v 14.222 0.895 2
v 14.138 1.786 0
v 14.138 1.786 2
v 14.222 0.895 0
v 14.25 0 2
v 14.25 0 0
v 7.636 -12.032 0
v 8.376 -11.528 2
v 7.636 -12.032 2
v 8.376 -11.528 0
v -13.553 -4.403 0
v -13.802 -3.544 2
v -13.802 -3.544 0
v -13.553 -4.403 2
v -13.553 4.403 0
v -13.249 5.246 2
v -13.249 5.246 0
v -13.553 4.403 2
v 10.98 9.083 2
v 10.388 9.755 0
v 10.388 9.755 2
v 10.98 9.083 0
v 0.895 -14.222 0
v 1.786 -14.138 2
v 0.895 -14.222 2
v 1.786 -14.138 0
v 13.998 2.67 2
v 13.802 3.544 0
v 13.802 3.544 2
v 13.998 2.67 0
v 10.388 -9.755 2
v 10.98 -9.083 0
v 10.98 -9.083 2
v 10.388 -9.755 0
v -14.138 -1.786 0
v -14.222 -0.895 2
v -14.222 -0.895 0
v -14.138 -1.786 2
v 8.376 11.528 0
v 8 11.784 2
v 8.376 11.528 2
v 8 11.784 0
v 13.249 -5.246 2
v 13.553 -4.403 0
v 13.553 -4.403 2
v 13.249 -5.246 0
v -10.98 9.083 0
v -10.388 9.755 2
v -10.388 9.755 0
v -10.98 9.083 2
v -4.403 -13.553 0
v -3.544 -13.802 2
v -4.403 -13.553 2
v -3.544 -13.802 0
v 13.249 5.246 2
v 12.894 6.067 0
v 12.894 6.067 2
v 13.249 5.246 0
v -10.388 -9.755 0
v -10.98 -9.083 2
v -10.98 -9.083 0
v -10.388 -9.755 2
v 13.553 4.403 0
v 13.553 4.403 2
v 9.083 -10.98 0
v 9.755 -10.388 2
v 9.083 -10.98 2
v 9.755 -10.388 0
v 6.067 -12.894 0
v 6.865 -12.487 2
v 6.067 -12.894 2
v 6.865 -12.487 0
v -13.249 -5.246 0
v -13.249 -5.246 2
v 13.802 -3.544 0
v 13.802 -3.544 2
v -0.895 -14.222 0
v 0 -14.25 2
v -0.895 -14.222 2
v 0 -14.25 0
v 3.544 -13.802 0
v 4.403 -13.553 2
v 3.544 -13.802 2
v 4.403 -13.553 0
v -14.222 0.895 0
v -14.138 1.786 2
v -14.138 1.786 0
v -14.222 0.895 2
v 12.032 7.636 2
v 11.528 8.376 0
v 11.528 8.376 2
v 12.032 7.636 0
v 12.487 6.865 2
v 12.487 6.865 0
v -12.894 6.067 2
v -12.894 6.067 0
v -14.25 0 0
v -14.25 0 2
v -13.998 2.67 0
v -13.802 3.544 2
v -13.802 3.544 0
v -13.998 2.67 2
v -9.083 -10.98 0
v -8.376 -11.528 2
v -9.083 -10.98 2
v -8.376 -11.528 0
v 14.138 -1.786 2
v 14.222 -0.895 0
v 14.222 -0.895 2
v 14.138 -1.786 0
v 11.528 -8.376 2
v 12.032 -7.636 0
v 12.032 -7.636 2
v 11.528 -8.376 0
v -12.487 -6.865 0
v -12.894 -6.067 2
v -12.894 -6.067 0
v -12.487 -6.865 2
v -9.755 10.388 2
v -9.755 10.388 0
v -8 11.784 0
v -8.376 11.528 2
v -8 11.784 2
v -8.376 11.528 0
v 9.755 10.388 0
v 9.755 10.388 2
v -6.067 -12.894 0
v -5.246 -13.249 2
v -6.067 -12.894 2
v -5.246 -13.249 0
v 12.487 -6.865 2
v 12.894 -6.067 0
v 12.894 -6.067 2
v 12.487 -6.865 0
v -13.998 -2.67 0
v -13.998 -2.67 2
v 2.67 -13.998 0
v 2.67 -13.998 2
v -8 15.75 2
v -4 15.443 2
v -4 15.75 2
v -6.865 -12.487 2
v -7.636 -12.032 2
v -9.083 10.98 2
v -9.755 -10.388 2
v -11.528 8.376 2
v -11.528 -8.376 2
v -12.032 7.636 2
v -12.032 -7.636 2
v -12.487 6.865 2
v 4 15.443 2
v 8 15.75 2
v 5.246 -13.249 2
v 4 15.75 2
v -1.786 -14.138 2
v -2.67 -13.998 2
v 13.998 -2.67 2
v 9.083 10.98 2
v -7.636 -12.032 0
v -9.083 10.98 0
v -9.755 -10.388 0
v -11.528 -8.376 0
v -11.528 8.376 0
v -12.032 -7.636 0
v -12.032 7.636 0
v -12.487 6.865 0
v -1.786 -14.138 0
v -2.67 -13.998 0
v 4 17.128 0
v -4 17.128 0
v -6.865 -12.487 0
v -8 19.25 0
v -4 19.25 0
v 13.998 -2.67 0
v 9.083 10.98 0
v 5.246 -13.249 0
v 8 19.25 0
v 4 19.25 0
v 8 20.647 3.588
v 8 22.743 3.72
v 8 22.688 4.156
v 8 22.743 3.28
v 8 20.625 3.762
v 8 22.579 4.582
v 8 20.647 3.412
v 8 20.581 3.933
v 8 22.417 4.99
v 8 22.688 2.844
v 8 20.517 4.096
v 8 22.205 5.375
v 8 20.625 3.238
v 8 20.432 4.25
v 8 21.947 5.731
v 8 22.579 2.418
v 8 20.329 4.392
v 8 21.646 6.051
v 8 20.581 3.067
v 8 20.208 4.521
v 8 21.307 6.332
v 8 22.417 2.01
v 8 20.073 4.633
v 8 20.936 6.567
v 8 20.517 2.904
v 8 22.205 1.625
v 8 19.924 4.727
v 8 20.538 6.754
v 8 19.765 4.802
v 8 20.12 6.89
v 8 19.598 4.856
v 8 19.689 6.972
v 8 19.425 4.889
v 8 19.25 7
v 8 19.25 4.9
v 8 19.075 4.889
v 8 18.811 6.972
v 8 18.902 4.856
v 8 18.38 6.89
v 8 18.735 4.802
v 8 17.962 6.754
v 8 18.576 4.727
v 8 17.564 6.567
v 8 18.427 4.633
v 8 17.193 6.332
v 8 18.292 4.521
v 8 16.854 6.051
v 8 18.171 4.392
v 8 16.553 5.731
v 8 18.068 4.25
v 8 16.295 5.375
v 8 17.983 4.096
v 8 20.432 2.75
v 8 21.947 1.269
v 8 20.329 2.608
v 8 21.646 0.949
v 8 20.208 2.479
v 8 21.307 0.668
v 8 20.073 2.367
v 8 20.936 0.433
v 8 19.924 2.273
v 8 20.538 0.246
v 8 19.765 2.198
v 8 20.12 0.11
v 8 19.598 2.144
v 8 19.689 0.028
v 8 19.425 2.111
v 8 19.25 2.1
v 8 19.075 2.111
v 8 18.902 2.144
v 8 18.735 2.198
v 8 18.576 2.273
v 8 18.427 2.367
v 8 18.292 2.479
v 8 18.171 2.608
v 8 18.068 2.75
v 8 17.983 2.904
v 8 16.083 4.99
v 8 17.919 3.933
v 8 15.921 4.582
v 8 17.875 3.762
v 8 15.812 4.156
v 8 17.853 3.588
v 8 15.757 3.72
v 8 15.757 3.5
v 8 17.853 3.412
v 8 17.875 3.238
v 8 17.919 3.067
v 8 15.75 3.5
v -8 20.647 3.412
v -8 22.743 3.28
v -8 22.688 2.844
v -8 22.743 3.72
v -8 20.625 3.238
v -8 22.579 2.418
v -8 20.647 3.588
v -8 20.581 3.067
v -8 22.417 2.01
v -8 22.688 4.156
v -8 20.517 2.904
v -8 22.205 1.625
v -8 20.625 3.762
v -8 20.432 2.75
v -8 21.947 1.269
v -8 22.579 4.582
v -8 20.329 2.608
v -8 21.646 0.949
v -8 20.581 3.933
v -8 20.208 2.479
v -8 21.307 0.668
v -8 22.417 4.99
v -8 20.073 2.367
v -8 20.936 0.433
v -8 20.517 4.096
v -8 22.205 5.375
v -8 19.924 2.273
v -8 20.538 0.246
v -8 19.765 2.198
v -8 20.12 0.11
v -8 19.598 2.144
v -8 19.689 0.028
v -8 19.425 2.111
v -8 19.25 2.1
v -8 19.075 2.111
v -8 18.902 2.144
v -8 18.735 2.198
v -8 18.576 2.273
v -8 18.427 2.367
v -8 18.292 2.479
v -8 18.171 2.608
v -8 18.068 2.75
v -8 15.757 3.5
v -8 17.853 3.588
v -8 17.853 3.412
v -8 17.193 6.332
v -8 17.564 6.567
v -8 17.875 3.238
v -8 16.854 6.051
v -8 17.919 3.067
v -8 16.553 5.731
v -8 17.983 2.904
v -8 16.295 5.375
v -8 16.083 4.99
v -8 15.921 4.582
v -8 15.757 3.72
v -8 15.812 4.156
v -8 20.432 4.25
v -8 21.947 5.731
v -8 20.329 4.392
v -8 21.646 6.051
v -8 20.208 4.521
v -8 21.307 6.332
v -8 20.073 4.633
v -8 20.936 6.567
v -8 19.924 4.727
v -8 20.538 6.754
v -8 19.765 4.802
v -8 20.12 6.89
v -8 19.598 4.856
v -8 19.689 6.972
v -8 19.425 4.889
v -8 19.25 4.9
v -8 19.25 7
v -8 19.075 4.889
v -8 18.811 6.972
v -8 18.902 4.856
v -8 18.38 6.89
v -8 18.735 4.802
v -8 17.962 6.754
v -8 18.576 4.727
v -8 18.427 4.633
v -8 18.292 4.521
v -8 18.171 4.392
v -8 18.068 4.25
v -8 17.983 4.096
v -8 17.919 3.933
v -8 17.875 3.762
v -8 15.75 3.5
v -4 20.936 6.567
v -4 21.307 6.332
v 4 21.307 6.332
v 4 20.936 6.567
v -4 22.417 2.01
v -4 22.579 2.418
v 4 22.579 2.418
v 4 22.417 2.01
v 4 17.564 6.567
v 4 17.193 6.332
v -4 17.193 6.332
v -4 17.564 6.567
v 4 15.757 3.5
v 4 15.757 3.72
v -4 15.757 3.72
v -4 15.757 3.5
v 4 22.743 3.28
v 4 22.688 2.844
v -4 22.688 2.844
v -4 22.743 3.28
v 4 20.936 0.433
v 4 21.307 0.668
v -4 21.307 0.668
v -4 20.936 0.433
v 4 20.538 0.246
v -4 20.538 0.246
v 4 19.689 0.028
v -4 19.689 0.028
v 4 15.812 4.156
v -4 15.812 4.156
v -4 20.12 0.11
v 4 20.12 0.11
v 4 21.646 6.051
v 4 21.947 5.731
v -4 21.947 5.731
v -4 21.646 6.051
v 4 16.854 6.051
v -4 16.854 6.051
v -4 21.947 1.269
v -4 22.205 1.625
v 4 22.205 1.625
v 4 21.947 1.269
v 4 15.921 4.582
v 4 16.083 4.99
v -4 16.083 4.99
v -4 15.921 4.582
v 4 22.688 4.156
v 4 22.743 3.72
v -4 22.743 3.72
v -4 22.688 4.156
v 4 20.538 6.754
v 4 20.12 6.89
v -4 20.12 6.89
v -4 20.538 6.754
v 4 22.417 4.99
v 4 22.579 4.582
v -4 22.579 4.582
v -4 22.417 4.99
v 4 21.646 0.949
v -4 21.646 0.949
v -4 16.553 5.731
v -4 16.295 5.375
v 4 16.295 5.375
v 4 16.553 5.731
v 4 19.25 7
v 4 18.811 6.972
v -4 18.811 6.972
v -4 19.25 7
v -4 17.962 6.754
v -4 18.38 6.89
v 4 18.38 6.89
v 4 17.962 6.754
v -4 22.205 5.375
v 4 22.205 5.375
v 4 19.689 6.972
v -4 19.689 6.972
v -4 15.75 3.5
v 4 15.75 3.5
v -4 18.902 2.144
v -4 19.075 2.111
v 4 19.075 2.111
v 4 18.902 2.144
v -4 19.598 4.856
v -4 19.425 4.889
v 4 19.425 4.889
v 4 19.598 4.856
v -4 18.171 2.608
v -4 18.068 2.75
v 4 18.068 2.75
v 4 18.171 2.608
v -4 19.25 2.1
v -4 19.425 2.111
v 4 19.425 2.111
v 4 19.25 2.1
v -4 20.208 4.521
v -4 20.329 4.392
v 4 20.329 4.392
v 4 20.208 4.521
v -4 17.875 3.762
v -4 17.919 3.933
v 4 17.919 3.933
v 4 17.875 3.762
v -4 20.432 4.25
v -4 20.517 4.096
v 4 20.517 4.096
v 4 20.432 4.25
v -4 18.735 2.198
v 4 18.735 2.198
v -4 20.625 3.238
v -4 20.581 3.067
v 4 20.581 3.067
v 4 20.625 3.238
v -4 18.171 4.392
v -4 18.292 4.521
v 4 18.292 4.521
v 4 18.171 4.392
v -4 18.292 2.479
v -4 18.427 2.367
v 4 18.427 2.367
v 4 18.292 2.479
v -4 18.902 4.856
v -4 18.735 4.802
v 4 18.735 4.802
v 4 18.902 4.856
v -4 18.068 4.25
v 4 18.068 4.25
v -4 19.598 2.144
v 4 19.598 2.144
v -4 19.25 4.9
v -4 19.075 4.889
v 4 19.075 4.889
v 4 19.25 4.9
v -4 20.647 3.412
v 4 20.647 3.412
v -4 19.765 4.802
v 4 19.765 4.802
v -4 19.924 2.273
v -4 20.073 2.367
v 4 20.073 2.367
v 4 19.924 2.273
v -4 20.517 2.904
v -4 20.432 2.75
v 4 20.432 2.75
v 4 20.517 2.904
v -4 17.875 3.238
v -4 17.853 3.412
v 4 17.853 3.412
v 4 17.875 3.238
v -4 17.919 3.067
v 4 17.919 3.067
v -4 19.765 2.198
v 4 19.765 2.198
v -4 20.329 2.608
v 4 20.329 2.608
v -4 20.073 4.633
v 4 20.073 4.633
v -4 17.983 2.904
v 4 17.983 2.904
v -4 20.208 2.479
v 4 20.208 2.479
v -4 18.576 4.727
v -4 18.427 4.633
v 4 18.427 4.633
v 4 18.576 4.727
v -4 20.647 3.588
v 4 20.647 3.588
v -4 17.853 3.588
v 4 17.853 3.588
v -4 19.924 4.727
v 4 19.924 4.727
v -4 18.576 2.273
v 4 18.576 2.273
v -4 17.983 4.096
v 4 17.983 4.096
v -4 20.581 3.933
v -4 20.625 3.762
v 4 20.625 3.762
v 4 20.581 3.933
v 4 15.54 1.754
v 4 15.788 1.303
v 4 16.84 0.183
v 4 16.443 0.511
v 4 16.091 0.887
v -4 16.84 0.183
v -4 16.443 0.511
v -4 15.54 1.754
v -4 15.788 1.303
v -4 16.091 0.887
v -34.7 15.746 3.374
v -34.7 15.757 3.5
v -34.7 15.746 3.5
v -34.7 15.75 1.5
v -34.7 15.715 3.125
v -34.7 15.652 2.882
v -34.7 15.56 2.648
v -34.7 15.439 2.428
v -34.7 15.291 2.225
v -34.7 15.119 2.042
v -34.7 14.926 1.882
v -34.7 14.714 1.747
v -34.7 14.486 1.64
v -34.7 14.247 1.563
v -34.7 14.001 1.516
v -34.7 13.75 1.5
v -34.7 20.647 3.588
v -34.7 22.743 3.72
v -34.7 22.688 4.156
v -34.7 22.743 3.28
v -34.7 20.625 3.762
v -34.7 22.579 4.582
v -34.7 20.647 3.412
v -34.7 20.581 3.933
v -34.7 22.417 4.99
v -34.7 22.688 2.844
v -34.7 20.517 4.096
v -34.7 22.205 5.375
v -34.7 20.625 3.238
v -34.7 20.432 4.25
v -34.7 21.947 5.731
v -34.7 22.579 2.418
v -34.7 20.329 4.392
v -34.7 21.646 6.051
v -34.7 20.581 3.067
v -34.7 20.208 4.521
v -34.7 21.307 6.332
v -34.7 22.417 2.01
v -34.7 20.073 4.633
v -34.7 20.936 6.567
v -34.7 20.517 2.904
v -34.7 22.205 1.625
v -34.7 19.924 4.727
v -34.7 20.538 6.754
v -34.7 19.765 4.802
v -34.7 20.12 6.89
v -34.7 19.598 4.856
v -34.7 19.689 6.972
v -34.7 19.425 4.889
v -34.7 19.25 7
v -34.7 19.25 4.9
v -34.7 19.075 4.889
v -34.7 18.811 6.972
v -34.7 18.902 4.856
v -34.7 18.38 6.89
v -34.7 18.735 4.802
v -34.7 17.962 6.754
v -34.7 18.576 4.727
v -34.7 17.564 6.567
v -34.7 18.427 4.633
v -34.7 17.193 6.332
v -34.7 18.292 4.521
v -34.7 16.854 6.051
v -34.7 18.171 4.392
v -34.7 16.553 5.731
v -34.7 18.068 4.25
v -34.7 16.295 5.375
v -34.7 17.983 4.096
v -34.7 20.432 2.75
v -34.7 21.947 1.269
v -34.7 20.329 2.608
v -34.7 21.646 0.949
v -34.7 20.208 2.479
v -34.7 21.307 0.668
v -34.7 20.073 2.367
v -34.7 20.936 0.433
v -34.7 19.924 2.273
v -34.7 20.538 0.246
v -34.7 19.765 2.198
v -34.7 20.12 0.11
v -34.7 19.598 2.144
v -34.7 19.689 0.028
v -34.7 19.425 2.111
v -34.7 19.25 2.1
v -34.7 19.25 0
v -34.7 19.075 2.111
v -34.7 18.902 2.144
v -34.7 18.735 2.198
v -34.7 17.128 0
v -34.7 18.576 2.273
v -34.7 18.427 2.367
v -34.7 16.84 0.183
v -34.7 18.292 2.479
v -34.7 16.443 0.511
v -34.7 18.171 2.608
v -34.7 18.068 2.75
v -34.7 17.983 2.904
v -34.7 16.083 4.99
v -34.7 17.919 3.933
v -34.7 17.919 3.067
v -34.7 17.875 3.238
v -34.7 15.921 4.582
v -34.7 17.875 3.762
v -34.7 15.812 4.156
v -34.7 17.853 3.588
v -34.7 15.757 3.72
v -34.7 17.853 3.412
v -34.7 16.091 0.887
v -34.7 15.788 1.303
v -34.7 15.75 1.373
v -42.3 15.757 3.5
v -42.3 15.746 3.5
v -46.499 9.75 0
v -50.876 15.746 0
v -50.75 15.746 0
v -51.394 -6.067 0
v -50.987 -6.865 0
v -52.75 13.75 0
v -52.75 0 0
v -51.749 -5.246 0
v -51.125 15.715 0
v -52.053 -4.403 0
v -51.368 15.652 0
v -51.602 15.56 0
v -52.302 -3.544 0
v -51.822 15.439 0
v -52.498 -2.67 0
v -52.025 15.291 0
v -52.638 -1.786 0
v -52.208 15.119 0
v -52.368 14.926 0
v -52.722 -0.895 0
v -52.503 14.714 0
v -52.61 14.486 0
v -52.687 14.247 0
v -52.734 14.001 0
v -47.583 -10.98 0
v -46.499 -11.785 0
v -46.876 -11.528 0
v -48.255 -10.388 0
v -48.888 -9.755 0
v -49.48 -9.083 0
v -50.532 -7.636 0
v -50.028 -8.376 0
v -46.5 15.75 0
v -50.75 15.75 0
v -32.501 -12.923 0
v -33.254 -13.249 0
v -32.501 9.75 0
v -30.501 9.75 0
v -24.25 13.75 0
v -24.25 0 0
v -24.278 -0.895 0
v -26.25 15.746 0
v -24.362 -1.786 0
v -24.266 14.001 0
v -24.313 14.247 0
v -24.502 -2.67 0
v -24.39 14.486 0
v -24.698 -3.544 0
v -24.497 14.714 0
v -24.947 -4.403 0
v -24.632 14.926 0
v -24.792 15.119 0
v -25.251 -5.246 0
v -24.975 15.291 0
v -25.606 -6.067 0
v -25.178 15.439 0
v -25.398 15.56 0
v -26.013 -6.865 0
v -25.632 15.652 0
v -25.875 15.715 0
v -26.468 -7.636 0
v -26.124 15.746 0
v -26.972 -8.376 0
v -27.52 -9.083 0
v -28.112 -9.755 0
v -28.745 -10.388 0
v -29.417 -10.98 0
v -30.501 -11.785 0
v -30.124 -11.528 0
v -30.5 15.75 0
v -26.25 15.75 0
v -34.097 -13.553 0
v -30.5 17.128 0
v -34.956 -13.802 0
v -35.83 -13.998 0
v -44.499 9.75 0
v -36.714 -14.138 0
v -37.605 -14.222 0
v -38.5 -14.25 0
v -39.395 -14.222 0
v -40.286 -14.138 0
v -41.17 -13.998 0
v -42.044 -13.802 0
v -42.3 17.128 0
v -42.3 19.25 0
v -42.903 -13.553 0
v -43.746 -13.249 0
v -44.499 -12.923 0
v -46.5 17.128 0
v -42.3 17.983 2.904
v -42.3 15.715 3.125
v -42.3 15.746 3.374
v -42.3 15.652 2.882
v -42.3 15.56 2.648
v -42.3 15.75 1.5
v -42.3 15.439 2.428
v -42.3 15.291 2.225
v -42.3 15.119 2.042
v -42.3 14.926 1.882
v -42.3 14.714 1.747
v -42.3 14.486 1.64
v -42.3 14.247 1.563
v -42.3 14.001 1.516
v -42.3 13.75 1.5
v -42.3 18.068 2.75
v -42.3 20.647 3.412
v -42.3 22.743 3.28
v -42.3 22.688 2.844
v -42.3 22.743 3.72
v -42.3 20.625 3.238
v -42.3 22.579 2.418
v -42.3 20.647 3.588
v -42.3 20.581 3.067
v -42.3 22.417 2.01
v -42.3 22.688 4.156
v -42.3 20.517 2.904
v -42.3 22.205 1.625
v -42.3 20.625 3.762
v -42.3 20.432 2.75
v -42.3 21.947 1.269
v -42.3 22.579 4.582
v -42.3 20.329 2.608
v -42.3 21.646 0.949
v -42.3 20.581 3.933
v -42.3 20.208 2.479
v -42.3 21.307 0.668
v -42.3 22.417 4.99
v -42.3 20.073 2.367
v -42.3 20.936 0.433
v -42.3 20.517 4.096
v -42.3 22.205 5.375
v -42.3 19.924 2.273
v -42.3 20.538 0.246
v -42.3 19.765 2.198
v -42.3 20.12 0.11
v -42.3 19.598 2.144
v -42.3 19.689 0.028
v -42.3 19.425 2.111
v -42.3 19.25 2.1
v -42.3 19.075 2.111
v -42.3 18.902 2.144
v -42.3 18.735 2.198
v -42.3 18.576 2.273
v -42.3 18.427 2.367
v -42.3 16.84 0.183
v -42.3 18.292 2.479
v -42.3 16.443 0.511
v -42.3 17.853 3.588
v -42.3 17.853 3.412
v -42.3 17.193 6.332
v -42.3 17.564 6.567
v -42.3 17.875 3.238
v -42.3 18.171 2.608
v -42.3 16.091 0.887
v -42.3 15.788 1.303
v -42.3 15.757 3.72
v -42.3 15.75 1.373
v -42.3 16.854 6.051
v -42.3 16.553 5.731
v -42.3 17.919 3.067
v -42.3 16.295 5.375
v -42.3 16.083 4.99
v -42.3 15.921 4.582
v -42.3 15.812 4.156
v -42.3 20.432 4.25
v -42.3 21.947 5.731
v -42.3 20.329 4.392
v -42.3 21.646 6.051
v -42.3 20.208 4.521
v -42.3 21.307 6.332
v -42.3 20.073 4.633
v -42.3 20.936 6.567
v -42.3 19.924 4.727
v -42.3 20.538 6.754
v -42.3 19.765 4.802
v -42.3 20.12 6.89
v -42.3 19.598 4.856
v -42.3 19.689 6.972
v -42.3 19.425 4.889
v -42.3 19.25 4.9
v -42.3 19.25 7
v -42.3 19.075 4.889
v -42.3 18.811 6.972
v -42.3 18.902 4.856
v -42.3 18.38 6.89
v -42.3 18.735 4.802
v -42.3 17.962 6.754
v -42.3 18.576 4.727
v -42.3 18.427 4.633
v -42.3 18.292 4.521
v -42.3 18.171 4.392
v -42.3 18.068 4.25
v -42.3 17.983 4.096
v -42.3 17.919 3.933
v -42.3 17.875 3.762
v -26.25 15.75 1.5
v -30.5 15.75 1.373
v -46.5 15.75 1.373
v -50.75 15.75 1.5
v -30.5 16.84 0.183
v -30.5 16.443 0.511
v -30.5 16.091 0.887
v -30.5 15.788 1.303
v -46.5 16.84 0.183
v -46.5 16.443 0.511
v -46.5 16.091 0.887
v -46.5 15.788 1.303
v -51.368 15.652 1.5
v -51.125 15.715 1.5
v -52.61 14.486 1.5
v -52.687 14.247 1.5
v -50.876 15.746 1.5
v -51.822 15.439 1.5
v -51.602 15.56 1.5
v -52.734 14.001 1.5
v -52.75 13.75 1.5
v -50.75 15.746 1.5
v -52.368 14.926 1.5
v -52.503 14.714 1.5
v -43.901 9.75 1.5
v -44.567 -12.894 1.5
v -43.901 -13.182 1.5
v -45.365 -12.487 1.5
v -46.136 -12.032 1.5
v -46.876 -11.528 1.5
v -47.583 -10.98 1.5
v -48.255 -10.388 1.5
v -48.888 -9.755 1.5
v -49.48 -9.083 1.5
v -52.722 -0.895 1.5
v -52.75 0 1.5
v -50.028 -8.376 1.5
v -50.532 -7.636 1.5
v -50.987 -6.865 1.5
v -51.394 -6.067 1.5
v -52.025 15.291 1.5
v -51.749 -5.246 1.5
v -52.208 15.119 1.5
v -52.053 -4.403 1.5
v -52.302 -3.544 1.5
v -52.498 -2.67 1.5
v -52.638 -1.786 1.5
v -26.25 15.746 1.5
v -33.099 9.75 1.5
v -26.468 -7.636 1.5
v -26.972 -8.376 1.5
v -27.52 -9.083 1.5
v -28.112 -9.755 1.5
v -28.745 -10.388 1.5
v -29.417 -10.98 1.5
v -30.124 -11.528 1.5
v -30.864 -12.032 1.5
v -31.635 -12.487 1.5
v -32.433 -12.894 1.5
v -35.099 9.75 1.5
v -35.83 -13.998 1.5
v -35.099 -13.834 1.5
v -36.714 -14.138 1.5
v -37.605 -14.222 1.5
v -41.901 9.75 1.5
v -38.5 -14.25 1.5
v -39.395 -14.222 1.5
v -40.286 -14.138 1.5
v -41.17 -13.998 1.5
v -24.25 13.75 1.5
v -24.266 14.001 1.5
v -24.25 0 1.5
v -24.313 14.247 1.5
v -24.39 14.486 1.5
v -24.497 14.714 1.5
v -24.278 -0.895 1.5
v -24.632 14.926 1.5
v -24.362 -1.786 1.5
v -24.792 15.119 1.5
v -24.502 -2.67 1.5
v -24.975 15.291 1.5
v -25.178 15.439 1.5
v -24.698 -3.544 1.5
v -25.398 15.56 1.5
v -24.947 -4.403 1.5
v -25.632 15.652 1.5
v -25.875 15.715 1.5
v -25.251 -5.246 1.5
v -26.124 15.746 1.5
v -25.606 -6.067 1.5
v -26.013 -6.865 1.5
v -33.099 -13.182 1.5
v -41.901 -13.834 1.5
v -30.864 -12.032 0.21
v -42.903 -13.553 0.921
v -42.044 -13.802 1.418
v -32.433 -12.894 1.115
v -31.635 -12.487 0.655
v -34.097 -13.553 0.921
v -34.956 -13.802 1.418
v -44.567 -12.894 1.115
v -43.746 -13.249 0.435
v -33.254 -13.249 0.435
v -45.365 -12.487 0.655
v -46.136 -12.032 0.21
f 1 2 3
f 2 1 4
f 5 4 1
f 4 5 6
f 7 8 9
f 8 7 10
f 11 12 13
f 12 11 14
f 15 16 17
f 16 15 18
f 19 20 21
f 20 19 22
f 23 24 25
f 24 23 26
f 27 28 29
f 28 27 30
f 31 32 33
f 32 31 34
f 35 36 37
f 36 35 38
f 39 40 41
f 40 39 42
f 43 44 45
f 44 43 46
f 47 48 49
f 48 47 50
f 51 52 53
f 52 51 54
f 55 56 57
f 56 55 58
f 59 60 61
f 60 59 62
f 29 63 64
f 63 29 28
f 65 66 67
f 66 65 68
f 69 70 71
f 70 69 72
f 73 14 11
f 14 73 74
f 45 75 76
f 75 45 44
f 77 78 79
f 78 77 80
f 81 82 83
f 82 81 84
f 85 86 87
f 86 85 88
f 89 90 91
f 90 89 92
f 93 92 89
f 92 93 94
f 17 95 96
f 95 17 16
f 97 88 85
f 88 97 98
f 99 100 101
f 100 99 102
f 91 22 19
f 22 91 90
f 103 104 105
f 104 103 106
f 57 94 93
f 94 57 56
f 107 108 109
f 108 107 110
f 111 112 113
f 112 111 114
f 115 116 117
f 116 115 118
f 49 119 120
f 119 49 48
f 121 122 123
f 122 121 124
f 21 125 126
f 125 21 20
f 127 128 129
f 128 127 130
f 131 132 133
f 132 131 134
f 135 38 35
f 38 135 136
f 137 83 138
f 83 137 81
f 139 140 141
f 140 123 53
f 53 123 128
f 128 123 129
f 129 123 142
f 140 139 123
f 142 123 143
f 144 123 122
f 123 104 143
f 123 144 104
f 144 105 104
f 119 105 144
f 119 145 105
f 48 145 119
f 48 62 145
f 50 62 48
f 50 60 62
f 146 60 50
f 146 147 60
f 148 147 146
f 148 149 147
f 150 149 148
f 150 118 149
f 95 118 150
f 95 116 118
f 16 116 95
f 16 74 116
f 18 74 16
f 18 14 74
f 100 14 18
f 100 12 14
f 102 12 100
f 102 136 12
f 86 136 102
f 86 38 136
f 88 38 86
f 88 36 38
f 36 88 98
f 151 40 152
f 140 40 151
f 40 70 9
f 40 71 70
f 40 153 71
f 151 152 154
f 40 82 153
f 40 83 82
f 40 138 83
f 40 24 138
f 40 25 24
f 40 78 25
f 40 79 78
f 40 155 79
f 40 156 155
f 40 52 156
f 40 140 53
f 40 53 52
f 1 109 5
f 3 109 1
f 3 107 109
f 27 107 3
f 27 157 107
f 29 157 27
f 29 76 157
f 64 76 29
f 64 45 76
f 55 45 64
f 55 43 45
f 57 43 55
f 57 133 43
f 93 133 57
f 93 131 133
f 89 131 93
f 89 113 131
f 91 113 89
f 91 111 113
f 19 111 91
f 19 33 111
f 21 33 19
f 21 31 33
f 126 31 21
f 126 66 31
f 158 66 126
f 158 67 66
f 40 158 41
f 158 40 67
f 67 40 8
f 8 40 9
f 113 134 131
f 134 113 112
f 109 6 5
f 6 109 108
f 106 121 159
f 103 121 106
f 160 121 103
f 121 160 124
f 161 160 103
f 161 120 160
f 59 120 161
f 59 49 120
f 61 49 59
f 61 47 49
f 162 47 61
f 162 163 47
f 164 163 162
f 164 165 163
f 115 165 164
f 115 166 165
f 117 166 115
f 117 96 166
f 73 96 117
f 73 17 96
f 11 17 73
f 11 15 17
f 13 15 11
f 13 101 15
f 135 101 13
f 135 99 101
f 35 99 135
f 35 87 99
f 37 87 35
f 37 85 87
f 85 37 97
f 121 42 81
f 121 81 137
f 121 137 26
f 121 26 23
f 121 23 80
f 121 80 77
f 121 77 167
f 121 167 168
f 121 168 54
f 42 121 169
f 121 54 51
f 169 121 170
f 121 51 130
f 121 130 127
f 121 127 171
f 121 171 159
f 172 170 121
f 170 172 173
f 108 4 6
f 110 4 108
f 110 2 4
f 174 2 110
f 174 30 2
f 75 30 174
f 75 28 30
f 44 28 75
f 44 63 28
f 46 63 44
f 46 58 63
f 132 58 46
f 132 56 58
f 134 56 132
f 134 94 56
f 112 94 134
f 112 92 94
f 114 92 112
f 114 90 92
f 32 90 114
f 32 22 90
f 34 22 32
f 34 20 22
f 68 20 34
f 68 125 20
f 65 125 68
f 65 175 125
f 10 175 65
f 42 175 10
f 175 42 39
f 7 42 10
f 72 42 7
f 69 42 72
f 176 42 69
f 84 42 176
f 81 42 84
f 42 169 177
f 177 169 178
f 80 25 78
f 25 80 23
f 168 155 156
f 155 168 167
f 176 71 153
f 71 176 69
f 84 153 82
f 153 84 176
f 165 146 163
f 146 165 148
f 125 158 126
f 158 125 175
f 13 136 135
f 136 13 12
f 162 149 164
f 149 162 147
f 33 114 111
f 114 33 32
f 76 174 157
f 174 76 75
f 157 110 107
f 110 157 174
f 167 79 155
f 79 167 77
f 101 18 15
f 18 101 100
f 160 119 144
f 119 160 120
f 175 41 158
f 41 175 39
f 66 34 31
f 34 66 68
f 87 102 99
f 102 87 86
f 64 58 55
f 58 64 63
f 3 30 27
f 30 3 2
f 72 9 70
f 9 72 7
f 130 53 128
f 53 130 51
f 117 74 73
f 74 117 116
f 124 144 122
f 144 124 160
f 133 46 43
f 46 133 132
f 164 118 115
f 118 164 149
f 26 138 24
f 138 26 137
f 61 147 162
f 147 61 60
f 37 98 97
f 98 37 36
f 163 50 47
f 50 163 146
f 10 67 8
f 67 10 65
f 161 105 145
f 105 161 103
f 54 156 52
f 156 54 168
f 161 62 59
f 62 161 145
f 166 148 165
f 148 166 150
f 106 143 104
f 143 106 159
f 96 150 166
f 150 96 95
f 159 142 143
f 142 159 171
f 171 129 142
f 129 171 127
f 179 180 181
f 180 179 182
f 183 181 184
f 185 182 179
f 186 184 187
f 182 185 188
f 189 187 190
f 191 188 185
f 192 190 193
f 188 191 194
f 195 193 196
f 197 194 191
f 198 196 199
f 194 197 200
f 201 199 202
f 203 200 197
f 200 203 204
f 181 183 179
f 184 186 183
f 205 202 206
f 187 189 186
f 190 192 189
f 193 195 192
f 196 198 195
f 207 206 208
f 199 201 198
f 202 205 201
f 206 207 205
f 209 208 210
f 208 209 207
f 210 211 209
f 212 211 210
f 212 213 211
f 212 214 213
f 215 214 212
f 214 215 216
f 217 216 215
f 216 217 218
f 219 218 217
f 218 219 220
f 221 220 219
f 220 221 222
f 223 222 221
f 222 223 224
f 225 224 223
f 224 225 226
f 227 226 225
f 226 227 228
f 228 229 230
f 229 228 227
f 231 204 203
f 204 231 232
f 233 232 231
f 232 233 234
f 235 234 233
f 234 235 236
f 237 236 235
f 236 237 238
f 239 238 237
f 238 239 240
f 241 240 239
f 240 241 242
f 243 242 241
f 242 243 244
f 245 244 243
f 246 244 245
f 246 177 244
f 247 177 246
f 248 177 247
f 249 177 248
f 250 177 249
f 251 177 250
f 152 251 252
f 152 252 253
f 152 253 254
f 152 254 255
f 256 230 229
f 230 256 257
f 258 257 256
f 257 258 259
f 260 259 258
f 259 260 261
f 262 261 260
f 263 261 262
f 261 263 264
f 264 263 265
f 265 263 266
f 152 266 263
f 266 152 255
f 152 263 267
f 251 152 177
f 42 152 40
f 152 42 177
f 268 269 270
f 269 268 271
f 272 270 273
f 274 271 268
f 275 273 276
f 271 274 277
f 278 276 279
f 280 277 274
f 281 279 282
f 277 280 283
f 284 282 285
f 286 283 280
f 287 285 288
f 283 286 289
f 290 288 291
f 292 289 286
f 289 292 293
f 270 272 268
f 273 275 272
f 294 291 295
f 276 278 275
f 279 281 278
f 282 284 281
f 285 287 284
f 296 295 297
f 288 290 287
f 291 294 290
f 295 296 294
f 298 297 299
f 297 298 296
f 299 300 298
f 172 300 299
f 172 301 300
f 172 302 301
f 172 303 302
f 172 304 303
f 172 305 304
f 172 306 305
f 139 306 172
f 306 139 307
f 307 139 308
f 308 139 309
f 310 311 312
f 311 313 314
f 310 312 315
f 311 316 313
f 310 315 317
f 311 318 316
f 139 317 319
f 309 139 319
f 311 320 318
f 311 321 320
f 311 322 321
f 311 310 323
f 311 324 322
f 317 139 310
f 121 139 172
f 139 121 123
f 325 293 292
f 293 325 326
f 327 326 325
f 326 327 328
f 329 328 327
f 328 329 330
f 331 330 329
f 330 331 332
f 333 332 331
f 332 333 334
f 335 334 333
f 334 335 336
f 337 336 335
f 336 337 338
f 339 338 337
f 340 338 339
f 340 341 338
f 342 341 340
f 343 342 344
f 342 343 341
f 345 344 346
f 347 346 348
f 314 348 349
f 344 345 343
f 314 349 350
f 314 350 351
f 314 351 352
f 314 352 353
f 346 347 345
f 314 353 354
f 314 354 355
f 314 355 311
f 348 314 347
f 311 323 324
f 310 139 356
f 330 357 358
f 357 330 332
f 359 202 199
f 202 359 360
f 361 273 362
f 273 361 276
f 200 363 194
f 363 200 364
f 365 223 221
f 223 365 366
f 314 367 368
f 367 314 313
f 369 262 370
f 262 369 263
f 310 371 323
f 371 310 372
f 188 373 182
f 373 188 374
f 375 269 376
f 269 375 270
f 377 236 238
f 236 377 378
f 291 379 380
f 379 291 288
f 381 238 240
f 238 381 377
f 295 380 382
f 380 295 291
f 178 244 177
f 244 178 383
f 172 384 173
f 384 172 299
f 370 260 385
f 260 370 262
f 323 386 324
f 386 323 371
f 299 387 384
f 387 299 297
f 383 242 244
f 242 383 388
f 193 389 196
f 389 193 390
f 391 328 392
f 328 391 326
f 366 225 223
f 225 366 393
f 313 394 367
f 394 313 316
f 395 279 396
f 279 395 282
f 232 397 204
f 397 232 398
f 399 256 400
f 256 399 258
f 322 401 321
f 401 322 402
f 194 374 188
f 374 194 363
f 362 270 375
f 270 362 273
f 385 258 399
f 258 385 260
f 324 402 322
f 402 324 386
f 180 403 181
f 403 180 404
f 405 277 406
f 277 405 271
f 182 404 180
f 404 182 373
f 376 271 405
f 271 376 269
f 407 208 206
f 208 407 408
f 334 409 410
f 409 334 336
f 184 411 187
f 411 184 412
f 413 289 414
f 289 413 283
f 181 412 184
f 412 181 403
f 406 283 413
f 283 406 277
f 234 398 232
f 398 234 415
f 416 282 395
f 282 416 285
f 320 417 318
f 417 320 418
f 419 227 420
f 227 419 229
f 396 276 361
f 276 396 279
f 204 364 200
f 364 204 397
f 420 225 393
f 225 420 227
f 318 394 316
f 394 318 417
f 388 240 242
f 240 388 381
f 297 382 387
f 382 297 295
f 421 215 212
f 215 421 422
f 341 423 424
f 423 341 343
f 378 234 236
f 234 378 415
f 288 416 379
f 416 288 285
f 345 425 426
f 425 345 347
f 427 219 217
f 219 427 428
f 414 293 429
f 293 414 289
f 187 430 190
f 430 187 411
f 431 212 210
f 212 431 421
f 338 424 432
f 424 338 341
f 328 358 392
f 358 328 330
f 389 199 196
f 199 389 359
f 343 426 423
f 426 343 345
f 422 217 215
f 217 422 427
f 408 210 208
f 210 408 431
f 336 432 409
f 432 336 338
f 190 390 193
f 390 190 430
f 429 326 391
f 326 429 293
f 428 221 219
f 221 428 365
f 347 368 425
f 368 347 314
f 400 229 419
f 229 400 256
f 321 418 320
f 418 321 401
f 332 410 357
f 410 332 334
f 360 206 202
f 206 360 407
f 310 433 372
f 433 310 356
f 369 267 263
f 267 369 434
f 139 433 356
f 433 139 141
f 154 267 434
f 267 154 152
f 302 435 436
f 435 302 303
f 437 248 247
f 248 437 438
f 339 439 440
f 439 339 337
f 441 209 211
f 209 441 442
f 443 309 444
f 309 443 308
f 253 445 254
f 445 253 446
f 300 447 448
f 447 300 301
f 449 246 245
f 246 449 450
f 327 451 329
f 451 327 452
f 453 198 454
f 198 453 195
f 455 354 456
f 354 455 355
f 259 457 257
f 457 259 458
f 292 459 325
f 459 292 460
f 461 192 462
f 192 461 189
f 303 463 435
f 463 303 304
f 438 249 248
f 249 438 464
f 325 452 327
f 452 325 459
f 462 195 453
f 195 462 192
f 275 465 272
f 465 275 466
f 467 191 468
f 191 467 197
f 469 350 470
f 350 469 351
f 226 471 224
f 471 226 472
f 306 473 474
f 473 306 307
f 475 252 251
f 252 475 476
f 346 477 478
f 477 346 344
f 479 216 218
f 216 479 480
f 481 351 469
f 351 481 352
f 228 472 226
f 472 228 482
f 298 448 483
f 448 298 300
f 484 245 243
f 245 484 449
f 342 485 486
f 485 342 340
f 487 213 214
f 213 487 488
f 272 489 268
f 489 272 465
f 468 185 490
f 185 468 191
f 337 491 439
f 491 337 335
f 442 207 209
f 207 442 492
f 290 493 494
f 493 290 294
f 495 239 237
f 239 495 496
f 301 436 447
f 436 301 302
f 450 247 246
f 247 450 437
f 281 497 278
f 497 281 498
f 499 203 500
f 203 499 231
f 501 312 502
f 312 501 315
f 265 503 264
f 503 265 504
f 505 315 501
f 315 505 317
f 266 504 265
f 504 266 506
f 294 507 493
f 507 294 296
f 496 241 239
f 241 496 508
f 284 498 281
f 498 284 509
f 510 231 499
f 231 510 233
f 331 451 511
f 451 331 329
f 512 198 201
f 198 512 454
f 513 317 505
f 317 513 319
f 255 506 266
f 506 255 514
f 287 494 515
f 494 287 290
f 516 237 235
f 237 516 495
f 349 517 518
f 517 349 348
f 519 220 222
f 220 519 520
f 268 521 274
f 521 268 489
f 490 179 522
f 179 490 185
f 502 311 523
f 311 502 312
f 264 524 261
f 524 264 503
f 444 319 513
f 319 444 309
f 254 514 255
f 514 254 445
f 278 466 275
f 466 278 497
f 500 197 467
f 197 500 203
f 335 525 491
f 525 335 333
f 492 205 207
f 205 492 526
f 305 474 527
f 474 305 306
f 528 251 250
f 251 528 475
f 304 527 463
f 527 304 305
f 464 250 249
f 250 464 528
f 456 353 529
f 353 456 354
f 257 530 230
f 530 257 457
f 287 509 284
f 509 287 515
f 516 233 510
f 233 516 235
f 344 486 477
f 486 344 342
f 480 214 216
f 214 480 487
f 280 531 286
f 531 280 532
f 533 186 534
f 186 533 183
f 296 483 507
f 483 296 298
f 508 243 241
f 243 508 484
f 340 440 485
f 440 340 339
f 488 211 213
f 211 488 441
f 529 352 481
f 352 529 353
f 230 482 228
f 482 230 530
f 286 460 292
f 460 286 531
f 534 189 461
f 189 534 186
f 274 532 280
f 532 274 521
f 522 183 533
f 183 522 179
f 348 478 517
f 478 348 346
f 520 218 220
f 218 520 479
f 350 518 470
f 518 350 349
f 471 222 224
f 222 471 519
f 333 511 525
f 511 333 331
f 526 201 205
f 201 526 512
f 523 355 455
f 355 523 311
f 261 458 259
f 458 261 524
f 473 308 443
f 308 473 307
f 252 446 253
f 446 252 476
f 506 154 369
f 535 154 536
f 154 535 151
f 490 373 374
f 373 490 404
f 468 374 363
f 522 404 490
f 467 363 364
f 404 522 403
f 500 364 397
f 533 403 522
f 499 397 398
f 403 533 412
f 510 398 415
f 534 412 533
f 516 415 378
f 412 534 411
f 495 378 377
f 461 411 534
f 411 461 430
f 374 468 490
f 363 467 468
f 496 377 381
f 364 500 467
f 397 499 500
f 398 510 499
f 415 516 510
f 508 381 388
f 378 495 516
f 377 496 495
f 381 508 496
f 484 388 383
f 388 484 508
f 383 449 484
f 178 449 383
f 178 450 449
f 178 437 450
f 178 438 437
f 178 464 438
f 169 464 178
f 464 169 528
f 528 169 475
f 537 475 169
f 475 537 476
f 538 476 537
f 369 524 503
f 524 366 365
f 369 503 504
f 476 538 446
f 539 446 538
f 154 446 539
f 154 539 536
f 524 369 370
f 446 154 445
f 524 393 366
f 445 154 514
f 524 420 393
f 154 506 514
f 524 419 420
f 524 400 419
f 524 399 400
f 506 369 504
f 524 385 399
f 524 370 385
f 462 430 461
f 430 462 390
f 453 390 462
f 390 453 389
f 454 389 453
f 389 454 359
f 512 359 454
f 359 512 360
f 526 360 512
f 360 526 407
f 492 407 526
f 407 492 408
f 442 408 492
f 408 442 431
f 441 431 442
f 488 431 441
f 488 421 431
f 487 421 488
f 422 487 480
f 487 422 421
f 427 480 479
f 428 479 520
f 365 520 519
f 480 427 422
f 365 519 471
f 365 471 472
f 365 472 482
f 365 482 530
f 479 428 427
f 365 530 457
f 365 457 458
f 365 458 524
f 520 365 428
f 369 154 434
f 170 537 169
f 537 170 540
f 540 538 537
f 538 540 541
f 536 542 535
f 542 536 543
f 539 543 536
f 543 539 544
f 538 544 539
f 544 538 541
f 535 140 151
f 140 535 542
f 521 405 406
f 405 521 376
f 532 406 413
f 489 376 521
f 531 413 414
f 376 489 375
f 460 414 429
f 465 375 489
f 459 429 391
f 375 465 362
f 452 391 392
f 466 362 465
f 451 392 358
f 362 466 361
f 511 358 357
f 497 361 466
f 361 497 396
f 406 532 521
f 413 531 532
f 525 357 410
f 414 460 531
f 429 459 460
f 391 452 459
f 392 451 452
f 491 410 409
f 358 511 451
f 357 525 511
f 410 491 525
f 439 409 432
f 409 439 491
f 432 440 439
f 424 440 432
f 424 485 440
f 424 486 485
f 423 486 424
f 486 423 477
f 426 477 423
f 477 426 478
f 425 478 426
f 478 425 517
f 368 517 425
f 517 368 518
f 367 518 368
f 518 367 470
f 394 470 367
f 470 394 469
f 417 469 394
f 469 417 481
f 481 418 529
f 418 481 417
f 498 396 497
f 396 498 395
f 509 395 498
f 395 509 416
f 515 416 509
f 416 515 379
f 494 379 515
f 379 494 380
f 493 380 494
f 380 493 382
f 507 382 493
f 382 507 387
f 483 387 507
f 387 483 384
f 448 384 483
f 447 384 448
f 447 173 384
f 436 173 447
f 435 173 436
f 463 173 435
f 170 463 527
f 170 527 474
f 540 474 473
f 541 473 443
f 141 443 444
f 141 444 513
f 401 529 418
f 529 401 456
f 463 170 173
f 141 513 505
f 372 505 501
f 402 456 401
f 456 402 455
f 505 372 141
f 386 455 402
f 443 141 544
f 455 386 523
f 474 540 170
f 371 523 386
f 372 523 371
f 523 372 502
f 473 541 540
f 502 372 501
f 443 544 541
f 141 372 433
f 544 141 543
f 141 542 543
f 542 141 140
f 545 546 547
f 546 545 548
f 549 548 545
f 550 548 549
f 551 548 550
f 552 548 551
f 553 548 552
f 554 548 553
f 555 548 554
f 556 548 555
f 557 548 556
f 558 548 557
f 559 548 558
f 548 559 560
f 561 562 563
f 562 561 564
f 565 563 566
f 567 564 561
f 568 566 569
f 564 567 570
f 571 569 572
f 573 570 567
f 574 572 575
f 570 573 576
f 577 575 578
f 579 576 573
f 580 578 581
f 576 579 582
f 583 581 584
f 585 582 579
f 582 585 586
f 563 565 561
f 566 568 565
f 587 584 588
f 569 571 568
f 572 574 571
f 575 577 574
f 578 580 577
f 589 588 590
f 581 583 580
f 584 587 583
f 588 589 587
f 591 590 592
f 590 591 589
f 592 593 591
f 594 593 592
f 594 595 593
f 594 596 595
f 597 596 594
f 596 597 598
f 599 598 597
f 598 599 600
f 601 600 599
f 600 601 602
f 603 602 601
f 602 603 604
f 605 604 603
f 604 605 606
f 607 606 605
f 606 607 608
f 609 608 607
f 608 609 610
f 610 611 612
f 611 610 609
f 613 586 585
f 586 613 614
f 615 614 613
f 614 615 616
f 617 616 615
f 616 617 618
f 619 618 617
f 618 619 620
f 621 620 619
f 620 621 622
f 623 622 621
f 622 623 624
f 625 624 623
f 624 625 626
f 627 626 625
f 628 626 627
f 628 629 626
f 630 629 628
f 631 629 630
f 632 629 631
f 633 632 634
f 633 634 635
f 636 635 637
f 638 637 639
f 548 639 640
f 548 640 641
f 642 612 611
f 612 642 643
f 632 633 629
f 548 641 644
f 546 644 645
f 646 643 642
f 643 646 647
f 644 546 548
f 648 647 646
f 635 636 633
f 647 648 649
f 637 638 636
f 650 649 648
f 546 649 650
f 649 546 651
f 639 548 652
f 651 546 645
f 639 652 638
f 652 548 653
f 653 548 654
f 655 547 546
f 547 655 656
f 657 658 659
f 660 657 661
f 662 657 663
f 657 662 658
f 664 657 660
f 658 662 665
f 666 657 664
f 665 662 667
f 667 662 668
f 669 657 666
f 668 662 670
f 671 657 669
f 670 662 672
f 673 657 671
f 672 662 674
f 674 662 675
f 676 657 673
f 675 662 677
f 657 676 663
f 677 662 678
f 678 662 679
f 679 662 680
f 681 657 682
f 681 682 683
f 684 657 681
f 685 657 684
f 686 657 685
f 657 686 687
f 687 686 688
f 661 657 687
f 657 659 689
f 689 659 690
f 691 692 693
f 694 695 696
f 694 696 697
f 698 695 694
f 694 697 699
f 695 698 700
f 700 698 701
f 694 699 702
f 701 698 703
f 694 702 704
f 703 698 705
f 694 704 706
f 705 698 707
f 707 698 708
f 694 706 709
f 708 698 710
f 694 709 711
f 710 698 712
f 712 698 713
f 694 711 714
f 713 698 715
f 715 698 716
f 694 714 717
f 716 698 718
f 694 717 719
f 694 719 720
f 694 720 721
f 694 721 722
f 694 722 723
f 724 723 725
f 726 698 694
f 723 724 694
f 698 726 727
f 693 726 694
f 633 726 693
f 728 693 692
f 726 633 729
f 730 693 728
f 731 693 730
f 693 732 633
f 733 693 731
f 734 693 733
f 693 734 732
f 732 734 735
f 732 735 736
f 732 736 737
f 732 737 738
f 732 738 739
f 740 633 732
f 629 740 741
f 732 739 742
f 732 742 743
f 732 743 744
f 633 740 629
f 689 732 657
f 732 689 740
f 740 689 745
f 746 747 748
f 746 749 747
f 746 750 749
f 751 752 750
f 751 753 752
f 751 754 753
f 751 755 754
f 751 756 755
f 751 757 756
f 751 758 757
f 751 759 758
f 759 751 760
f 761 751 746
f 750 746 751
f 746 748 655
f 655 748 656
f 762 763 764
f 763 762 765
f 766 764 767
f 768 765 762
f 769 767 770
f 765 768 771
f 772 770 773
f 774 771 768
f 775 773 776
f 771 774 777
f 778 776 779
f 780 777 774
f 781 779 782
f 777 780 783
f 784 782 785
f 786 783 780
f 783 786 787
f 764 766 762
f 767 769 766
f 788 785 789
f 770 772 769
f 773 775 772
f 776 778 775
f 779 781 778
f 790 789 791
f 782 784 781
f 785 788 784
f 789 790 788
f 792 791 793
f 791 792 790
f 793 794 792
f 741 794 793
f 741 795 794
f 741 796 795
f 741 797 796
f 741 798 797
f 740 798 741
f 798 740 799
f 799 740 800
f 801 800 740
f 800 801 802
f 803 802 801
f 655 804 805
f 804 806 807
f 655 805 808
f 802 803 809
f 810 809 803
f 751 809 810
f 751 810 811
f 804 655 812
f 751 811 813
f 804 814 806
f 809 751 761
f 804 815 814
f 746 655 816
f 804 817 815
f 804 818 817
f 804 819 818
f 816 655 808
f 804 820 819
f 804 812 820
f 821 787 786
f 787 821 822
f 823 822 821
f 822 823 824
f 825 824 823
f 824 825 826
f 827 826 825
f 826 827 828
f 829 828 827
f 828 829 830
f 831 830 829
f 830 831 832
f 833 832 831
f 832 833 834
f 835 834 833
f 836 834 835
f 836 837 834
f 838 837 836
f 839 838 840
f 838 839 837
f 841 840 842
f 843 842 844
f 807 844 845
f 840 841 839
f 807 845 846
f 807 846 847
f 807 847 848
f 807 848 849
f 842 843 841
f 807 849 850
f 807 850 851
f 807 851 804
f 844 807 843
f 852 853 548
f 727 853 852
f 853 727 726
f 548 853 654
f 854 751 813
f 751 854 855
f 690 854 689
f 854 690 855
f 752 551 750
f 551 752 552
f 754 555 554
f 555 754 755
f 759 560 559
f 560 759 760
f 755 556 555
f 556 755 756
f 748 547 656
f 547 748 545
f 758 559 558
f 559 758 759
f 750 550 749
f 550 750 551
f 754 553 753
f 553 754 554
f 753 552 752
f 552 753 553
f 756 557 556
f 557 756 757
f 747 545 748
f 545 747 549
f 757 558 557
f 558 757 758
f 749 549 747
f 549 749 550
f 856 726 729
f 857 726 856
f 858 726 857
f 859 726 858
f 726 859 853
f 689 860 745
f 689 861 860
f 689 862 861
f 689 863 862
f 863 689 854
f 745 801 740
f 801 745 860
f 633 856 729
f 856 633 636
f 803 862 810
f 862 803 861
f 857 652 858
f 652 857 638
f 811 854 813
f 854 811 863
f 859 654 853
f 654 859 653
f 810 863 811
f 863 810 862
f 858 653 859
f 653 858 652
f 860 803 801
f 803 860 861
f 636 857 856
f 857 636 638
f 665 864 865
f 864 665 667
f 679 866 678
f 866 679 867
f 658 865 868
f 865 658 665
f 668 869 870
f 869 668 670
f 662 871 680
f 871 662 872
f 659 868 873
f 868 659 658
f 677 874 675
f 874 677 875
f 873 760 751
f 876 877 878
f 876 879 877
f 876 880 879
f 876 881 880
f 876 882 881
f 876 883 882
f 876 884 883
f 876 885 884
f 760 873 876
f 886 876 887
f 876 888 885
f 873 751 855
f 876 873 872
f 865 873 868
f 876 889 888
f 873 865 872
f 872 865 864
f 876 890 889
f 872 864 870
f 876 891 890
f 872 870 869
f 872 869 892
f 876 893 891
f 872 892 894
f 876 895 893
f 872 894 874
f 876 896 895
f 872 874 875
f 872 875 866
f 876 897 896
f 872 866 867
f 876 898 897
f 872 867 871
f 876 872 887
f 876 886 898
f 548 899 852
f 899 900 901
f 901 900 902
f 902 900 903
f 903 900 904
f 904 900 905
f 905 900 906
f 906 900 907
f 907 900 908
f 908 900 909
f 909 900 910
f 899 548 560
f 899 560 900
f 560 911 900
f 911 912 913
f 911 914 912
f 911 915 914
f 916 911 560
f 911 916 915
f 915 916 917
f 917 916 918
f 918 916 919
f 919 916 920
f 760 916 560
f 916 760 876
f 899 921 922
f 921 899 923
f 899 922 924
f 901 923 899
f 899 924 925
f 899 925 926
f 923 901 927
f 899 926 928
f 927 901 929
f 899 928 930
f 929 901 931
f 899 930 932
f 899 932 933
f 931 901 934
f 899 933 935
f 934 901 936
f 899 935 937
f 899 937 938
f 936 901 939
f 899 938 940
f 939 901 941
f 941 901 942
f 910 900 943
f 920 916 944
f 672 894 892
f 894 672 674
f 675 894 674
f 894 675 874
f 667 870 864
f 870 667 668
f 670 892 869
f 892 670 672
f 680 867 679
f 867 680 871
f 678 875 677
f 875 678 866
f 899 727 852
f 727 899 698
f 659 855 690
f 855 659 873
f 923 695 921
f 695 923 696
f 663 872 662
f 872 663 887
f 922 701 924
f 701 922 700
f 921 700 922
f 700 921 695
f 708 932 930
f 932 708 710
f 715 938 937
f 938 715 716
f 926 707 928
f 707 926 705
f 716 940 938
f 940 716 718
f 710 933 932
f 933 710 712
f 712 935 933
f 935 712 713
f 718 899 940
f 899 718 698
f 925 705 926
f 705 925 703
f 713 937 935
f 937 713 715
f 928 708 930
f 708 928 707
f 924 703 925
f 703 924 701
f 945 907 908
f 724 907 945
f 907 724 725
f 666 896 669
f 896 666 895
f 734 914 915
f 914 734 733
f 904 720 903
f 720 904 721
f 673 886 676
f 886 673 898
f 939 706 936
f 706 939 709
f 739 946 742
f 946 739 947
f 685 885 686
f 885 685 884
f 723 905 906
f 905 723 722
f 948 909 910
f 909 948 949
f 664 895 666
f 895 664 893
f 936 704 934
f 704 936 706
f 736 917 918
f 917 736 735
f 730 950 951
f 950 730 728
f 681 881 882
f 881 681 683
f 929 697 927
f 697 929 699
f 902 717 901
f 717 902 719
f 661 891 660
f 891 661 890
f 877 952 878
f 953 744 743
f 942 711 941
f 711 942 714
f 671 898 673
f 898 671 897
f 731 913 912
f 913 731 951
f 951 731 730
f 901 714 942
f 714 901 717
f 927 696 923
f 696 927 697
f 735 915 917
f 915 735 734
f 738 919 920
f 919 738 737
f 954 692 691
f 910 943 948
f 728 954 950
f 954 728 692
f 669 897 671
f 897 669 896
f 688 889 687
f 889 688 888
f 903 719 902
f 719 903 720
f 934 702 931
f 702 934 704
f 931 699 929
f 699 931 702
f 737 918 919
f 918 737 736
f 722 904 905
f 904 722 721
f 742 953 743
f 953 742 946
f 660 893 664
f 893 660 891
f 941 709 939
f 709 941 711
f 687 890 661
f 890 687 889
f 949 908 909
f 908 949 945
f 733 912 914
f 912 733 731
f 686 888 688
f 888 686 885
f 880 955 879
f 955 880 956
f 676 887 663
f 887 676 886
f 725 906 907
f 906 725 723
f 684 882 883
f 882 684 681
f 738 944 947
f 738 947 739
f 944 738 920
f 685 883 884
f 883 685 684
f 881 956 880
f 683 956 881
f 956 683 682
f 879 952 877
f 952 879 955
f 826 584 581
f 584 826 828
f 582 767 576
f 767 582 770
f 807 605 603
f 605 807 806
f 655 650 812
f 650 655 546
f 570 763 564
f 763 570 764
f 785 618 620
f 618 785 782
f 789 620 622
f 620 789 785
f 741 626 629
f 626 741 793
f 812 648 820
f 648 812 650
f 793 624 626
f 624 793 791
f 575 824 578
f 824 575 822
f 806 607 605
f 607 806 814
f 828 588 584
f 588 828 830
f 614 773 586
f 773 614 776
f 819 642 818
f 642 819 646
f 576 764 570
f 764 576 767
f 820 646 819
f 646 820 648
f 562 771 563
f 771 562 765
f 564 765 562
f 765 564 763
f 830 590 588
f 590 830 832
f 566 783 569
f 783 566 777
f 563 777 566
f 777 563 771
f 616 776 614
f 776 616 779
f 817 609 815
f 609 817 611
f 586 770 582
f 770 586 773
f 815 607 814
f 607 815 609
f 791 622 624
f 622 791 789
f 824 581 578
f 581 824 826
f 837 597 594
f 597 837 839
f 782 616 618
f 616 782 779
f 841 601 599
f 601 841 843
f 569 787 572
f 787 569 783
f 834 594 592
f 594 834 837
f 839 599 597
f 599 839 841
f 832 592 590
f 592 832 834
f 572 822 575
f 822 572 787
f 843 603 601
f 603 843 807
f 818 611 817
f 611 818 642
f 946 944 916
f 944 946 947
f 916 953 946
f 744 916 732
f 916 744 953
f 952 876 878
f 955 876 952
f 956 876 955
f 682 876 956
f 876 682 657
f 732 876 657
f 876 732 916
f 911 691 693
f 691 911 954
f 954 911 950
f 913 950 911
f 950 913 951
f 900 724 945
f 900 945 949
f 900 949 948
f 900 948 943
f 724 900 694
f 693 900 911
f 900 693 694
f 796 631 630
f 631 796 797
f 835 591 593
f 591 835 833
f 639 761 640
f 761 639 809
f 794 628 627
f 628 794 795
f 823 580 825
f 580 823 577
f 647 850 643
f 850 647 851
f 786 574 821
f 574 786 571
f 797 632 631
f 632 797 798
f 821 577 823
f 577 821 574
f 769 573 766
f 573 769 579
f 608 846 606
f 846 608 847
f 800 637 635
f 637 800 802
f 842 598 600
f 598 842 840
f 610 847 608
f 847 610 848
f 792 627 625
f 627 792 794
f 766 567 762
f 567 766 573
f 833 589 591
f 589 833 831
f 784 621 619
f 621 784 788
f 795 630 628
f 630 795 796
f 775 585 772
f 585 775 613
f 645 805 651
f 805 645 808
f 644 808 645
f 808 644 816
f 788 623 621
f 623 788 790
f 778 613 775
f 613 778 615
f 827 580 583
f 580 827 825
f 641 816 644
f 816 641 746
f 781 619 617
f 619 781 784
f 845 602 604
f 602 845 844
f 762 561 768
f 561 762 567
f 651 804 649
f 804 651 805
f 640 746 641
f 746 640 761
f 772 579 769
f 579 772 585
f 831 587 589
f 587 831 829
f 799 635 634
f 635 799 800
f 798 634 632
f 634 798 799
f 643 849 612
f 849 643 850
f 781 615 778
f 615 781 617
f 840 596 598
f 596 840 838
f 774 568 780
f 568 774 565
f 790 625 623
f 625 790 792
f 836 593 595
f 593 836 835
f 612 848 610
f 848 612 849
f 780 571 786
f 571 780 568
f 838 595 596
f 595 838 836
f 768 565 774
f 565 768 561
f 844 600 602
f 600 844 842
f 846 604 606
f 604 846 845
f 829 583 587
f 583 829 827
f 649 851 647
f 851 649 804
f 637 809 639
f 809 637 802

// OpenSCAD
//Diameter of coin in mm
coin_diameter = 28.5;
//Thickness of coin in mm
coin_thickness = 2.0;
//Screw size in mm
screw_diameter = 3.0;
//Screw length in mm
screw_length = 16;
//Length of the neck in mm (affects the size of the paper clip)
neck_length = 5;
//Needed parts
parts = "Both"; //[Coin, Paperclip, Both]

wallthickness = 2*1;
coin_radius = coin_diameter / 2.0;
paperholder_thickness = 1.5*1;

module CreateCoin()
{
    difference()
    {
        union()
        {
            cylinder(h=coin_thickness, r=coin_radius, $fn = 100);
            translate([-screw_length/2, 0, 0 ])
            cube([screw_length, neck_length+coin_radius, coin_thickness]);
            translate([-screw_length/2, neck_length+coin_radius, screw_diameter/2+wallthickness])
            rotate([0,90,0])
            cylinder(h=screw_length, r=screw_diameter/2+wallthickness, $fn = 50);
            translate([-screw_length/2, neck_length+coin_radius-screw_diameter/2-wallthickness, 0])
            cube([screw_length, screw_diameter/2+wallthickness, screw_diameter/2+wallthickness]);
        }
        union()
        {
            translate([-screw_length/2-1, neck_length+coin_radius, screw_diameter/2+wallthickness])
            rotate([0,90,0])
            cylinder(h=screw_length+2, r=screw_diameter/2-0.1, $fn = 50);
            translate([-screw_length/4, neck_length+coin_radius, screw_diameter/2+wallthickness])
            rotate([0,90,0])
            cylinder(h=screw_length/2, r=screw_diameter/2+wallthickness+0.6, $fn = 50);
        }
    }
}

module CreatePaperHolder()
{
    difference()
    {
        union()
        {
            yoffset = coin_radius+(neck_length-(screw_diameter/2+wallthickness)-((screw_diameter/2+wallthickness)-paperholder_thickness))-3;
            
            
            translate([-screw_length/4+0.2, neck_length+coin_radius, screw_diameter/2+wallthickness])
            rotate([0,90,0])
            cylinder(h=screw_length/2-0.4, r=screw_diameter/2+wallthickness, $fn = 50);
            translate([-screw_length/4+0.2, neck_length+coin_radius-(screw_diameter/2+wallthickness), 0])
            cube([screw_length/2-0.4, screw_diameter/2+wallthickness, screw_diameter/2+wallthickness]);
            difference()
            {
                translate([-screw_length/4+0.2, neck_length+coin_radius-(screw_diameter/2+wallthickness)-((screw_diameter/2+wallthickness)-paperholder_thickness), 0])
                cube([screw_length/2-0.4, ((screw_diameter/2+wallthickness)-paperholder_thickness), screw_diameter/2+wallthickness]);
                translate([-screw_length/4, neck_length+coin_radius-(screw_diameter/2+wallthickness)-((screw_diameter/2+wallthickness)-paperholder_thickness), screw_diameter/2+wallthickness])
                rotate([0,90,0])
                cylinder(h=screw_length/2, r=((screw_diameter/2+wallthickness)-paperholder_thickness), $fn=50);
            }
            difference()
            {
                translate([-screw_length/2, neck_length+coin_radius-(screw_diameter/2+wallthickness), 0])
                cube([screw_length, (screw_diameter/2+wallthickness), paperholder_thickness]);
                translate([-screw_length/2-1, neck_length+coin_radius, screw_diameter/2+wallthickness])
                rotate([0,90,0])
                cylinder(h=screw_length+2, r=screw_diameter/2+wallthickness+0.6, $fn = 50);
                
            }
            intersection()
            {
                length = coin_diameter+neck_length-(screw_diameter/2+wallthickness);
                union()
                {
                   translate([-coin_radius, -coin_radius, 0])
                   cube([coin_diameter, length-2, paperholder_thickness]);               translate([-coin_radius+2, -coin_radius+length-2, 0])
                   {
                        cylinder(r=2, h = paperholder_thickness, $fn=50);
                       cube([coin_diameter-4, 2, paperholder_thickness]);
                   }
                   translate([coin_radius-2, -coin_radius+length-2, 0])
                   cylinder(r=2, h = paperholder_thickness, $fn=50);                   
                }
                union()
                {
                    cylinder(r=coin_radius, h=paperholder_thickness, $fn=100);
                    translate([-coin_radius, 0, 0])
                    cube([coin_diameter, coin_radius+neck_length-(screw_diameter/2+wallthickness), paperholder_thickness]);
                    
                }
            }            
        }
        union()
        {
            translate([-screw_length/2-1, neck_length+coin_radius, screw_diameter/2+wallthickness])
            rotate([0,90,0])
            cylinder(h=screw_length+2, r=screw_diameter/2-0.1, $fn = 50);
            length = coin_diameter+neck_length-(screw_diameter/2+wallthickness);
            cutLength = length - 6;
            translate([0, -coin_radius, paperholder_thickness/2])
            {
                translate([-coin_diameter/5, 0, 0])
                rotate([0,60,0])
                cube([1, cutLength*2, 10], center = true);
                translate([coin_diameter/5, 0, 0])
                rotate([0,-60,0])
                cube([1, cutLength*2, 10], center = true);
            }
        }        
    }    
}

if( parts == "Both" || parts == "Coin" )
{
    CreateCoin();
}
if( parts == "Both" || parts == "Paperclip" )
{
    translate([-(coin_diameter+10), 0, 0])
    CreatePaperHolder();
}
//translate([0,0,screw_diameter+wallthickness*2])
//rotate([0,180,0])
//CreatePaperHolder();


